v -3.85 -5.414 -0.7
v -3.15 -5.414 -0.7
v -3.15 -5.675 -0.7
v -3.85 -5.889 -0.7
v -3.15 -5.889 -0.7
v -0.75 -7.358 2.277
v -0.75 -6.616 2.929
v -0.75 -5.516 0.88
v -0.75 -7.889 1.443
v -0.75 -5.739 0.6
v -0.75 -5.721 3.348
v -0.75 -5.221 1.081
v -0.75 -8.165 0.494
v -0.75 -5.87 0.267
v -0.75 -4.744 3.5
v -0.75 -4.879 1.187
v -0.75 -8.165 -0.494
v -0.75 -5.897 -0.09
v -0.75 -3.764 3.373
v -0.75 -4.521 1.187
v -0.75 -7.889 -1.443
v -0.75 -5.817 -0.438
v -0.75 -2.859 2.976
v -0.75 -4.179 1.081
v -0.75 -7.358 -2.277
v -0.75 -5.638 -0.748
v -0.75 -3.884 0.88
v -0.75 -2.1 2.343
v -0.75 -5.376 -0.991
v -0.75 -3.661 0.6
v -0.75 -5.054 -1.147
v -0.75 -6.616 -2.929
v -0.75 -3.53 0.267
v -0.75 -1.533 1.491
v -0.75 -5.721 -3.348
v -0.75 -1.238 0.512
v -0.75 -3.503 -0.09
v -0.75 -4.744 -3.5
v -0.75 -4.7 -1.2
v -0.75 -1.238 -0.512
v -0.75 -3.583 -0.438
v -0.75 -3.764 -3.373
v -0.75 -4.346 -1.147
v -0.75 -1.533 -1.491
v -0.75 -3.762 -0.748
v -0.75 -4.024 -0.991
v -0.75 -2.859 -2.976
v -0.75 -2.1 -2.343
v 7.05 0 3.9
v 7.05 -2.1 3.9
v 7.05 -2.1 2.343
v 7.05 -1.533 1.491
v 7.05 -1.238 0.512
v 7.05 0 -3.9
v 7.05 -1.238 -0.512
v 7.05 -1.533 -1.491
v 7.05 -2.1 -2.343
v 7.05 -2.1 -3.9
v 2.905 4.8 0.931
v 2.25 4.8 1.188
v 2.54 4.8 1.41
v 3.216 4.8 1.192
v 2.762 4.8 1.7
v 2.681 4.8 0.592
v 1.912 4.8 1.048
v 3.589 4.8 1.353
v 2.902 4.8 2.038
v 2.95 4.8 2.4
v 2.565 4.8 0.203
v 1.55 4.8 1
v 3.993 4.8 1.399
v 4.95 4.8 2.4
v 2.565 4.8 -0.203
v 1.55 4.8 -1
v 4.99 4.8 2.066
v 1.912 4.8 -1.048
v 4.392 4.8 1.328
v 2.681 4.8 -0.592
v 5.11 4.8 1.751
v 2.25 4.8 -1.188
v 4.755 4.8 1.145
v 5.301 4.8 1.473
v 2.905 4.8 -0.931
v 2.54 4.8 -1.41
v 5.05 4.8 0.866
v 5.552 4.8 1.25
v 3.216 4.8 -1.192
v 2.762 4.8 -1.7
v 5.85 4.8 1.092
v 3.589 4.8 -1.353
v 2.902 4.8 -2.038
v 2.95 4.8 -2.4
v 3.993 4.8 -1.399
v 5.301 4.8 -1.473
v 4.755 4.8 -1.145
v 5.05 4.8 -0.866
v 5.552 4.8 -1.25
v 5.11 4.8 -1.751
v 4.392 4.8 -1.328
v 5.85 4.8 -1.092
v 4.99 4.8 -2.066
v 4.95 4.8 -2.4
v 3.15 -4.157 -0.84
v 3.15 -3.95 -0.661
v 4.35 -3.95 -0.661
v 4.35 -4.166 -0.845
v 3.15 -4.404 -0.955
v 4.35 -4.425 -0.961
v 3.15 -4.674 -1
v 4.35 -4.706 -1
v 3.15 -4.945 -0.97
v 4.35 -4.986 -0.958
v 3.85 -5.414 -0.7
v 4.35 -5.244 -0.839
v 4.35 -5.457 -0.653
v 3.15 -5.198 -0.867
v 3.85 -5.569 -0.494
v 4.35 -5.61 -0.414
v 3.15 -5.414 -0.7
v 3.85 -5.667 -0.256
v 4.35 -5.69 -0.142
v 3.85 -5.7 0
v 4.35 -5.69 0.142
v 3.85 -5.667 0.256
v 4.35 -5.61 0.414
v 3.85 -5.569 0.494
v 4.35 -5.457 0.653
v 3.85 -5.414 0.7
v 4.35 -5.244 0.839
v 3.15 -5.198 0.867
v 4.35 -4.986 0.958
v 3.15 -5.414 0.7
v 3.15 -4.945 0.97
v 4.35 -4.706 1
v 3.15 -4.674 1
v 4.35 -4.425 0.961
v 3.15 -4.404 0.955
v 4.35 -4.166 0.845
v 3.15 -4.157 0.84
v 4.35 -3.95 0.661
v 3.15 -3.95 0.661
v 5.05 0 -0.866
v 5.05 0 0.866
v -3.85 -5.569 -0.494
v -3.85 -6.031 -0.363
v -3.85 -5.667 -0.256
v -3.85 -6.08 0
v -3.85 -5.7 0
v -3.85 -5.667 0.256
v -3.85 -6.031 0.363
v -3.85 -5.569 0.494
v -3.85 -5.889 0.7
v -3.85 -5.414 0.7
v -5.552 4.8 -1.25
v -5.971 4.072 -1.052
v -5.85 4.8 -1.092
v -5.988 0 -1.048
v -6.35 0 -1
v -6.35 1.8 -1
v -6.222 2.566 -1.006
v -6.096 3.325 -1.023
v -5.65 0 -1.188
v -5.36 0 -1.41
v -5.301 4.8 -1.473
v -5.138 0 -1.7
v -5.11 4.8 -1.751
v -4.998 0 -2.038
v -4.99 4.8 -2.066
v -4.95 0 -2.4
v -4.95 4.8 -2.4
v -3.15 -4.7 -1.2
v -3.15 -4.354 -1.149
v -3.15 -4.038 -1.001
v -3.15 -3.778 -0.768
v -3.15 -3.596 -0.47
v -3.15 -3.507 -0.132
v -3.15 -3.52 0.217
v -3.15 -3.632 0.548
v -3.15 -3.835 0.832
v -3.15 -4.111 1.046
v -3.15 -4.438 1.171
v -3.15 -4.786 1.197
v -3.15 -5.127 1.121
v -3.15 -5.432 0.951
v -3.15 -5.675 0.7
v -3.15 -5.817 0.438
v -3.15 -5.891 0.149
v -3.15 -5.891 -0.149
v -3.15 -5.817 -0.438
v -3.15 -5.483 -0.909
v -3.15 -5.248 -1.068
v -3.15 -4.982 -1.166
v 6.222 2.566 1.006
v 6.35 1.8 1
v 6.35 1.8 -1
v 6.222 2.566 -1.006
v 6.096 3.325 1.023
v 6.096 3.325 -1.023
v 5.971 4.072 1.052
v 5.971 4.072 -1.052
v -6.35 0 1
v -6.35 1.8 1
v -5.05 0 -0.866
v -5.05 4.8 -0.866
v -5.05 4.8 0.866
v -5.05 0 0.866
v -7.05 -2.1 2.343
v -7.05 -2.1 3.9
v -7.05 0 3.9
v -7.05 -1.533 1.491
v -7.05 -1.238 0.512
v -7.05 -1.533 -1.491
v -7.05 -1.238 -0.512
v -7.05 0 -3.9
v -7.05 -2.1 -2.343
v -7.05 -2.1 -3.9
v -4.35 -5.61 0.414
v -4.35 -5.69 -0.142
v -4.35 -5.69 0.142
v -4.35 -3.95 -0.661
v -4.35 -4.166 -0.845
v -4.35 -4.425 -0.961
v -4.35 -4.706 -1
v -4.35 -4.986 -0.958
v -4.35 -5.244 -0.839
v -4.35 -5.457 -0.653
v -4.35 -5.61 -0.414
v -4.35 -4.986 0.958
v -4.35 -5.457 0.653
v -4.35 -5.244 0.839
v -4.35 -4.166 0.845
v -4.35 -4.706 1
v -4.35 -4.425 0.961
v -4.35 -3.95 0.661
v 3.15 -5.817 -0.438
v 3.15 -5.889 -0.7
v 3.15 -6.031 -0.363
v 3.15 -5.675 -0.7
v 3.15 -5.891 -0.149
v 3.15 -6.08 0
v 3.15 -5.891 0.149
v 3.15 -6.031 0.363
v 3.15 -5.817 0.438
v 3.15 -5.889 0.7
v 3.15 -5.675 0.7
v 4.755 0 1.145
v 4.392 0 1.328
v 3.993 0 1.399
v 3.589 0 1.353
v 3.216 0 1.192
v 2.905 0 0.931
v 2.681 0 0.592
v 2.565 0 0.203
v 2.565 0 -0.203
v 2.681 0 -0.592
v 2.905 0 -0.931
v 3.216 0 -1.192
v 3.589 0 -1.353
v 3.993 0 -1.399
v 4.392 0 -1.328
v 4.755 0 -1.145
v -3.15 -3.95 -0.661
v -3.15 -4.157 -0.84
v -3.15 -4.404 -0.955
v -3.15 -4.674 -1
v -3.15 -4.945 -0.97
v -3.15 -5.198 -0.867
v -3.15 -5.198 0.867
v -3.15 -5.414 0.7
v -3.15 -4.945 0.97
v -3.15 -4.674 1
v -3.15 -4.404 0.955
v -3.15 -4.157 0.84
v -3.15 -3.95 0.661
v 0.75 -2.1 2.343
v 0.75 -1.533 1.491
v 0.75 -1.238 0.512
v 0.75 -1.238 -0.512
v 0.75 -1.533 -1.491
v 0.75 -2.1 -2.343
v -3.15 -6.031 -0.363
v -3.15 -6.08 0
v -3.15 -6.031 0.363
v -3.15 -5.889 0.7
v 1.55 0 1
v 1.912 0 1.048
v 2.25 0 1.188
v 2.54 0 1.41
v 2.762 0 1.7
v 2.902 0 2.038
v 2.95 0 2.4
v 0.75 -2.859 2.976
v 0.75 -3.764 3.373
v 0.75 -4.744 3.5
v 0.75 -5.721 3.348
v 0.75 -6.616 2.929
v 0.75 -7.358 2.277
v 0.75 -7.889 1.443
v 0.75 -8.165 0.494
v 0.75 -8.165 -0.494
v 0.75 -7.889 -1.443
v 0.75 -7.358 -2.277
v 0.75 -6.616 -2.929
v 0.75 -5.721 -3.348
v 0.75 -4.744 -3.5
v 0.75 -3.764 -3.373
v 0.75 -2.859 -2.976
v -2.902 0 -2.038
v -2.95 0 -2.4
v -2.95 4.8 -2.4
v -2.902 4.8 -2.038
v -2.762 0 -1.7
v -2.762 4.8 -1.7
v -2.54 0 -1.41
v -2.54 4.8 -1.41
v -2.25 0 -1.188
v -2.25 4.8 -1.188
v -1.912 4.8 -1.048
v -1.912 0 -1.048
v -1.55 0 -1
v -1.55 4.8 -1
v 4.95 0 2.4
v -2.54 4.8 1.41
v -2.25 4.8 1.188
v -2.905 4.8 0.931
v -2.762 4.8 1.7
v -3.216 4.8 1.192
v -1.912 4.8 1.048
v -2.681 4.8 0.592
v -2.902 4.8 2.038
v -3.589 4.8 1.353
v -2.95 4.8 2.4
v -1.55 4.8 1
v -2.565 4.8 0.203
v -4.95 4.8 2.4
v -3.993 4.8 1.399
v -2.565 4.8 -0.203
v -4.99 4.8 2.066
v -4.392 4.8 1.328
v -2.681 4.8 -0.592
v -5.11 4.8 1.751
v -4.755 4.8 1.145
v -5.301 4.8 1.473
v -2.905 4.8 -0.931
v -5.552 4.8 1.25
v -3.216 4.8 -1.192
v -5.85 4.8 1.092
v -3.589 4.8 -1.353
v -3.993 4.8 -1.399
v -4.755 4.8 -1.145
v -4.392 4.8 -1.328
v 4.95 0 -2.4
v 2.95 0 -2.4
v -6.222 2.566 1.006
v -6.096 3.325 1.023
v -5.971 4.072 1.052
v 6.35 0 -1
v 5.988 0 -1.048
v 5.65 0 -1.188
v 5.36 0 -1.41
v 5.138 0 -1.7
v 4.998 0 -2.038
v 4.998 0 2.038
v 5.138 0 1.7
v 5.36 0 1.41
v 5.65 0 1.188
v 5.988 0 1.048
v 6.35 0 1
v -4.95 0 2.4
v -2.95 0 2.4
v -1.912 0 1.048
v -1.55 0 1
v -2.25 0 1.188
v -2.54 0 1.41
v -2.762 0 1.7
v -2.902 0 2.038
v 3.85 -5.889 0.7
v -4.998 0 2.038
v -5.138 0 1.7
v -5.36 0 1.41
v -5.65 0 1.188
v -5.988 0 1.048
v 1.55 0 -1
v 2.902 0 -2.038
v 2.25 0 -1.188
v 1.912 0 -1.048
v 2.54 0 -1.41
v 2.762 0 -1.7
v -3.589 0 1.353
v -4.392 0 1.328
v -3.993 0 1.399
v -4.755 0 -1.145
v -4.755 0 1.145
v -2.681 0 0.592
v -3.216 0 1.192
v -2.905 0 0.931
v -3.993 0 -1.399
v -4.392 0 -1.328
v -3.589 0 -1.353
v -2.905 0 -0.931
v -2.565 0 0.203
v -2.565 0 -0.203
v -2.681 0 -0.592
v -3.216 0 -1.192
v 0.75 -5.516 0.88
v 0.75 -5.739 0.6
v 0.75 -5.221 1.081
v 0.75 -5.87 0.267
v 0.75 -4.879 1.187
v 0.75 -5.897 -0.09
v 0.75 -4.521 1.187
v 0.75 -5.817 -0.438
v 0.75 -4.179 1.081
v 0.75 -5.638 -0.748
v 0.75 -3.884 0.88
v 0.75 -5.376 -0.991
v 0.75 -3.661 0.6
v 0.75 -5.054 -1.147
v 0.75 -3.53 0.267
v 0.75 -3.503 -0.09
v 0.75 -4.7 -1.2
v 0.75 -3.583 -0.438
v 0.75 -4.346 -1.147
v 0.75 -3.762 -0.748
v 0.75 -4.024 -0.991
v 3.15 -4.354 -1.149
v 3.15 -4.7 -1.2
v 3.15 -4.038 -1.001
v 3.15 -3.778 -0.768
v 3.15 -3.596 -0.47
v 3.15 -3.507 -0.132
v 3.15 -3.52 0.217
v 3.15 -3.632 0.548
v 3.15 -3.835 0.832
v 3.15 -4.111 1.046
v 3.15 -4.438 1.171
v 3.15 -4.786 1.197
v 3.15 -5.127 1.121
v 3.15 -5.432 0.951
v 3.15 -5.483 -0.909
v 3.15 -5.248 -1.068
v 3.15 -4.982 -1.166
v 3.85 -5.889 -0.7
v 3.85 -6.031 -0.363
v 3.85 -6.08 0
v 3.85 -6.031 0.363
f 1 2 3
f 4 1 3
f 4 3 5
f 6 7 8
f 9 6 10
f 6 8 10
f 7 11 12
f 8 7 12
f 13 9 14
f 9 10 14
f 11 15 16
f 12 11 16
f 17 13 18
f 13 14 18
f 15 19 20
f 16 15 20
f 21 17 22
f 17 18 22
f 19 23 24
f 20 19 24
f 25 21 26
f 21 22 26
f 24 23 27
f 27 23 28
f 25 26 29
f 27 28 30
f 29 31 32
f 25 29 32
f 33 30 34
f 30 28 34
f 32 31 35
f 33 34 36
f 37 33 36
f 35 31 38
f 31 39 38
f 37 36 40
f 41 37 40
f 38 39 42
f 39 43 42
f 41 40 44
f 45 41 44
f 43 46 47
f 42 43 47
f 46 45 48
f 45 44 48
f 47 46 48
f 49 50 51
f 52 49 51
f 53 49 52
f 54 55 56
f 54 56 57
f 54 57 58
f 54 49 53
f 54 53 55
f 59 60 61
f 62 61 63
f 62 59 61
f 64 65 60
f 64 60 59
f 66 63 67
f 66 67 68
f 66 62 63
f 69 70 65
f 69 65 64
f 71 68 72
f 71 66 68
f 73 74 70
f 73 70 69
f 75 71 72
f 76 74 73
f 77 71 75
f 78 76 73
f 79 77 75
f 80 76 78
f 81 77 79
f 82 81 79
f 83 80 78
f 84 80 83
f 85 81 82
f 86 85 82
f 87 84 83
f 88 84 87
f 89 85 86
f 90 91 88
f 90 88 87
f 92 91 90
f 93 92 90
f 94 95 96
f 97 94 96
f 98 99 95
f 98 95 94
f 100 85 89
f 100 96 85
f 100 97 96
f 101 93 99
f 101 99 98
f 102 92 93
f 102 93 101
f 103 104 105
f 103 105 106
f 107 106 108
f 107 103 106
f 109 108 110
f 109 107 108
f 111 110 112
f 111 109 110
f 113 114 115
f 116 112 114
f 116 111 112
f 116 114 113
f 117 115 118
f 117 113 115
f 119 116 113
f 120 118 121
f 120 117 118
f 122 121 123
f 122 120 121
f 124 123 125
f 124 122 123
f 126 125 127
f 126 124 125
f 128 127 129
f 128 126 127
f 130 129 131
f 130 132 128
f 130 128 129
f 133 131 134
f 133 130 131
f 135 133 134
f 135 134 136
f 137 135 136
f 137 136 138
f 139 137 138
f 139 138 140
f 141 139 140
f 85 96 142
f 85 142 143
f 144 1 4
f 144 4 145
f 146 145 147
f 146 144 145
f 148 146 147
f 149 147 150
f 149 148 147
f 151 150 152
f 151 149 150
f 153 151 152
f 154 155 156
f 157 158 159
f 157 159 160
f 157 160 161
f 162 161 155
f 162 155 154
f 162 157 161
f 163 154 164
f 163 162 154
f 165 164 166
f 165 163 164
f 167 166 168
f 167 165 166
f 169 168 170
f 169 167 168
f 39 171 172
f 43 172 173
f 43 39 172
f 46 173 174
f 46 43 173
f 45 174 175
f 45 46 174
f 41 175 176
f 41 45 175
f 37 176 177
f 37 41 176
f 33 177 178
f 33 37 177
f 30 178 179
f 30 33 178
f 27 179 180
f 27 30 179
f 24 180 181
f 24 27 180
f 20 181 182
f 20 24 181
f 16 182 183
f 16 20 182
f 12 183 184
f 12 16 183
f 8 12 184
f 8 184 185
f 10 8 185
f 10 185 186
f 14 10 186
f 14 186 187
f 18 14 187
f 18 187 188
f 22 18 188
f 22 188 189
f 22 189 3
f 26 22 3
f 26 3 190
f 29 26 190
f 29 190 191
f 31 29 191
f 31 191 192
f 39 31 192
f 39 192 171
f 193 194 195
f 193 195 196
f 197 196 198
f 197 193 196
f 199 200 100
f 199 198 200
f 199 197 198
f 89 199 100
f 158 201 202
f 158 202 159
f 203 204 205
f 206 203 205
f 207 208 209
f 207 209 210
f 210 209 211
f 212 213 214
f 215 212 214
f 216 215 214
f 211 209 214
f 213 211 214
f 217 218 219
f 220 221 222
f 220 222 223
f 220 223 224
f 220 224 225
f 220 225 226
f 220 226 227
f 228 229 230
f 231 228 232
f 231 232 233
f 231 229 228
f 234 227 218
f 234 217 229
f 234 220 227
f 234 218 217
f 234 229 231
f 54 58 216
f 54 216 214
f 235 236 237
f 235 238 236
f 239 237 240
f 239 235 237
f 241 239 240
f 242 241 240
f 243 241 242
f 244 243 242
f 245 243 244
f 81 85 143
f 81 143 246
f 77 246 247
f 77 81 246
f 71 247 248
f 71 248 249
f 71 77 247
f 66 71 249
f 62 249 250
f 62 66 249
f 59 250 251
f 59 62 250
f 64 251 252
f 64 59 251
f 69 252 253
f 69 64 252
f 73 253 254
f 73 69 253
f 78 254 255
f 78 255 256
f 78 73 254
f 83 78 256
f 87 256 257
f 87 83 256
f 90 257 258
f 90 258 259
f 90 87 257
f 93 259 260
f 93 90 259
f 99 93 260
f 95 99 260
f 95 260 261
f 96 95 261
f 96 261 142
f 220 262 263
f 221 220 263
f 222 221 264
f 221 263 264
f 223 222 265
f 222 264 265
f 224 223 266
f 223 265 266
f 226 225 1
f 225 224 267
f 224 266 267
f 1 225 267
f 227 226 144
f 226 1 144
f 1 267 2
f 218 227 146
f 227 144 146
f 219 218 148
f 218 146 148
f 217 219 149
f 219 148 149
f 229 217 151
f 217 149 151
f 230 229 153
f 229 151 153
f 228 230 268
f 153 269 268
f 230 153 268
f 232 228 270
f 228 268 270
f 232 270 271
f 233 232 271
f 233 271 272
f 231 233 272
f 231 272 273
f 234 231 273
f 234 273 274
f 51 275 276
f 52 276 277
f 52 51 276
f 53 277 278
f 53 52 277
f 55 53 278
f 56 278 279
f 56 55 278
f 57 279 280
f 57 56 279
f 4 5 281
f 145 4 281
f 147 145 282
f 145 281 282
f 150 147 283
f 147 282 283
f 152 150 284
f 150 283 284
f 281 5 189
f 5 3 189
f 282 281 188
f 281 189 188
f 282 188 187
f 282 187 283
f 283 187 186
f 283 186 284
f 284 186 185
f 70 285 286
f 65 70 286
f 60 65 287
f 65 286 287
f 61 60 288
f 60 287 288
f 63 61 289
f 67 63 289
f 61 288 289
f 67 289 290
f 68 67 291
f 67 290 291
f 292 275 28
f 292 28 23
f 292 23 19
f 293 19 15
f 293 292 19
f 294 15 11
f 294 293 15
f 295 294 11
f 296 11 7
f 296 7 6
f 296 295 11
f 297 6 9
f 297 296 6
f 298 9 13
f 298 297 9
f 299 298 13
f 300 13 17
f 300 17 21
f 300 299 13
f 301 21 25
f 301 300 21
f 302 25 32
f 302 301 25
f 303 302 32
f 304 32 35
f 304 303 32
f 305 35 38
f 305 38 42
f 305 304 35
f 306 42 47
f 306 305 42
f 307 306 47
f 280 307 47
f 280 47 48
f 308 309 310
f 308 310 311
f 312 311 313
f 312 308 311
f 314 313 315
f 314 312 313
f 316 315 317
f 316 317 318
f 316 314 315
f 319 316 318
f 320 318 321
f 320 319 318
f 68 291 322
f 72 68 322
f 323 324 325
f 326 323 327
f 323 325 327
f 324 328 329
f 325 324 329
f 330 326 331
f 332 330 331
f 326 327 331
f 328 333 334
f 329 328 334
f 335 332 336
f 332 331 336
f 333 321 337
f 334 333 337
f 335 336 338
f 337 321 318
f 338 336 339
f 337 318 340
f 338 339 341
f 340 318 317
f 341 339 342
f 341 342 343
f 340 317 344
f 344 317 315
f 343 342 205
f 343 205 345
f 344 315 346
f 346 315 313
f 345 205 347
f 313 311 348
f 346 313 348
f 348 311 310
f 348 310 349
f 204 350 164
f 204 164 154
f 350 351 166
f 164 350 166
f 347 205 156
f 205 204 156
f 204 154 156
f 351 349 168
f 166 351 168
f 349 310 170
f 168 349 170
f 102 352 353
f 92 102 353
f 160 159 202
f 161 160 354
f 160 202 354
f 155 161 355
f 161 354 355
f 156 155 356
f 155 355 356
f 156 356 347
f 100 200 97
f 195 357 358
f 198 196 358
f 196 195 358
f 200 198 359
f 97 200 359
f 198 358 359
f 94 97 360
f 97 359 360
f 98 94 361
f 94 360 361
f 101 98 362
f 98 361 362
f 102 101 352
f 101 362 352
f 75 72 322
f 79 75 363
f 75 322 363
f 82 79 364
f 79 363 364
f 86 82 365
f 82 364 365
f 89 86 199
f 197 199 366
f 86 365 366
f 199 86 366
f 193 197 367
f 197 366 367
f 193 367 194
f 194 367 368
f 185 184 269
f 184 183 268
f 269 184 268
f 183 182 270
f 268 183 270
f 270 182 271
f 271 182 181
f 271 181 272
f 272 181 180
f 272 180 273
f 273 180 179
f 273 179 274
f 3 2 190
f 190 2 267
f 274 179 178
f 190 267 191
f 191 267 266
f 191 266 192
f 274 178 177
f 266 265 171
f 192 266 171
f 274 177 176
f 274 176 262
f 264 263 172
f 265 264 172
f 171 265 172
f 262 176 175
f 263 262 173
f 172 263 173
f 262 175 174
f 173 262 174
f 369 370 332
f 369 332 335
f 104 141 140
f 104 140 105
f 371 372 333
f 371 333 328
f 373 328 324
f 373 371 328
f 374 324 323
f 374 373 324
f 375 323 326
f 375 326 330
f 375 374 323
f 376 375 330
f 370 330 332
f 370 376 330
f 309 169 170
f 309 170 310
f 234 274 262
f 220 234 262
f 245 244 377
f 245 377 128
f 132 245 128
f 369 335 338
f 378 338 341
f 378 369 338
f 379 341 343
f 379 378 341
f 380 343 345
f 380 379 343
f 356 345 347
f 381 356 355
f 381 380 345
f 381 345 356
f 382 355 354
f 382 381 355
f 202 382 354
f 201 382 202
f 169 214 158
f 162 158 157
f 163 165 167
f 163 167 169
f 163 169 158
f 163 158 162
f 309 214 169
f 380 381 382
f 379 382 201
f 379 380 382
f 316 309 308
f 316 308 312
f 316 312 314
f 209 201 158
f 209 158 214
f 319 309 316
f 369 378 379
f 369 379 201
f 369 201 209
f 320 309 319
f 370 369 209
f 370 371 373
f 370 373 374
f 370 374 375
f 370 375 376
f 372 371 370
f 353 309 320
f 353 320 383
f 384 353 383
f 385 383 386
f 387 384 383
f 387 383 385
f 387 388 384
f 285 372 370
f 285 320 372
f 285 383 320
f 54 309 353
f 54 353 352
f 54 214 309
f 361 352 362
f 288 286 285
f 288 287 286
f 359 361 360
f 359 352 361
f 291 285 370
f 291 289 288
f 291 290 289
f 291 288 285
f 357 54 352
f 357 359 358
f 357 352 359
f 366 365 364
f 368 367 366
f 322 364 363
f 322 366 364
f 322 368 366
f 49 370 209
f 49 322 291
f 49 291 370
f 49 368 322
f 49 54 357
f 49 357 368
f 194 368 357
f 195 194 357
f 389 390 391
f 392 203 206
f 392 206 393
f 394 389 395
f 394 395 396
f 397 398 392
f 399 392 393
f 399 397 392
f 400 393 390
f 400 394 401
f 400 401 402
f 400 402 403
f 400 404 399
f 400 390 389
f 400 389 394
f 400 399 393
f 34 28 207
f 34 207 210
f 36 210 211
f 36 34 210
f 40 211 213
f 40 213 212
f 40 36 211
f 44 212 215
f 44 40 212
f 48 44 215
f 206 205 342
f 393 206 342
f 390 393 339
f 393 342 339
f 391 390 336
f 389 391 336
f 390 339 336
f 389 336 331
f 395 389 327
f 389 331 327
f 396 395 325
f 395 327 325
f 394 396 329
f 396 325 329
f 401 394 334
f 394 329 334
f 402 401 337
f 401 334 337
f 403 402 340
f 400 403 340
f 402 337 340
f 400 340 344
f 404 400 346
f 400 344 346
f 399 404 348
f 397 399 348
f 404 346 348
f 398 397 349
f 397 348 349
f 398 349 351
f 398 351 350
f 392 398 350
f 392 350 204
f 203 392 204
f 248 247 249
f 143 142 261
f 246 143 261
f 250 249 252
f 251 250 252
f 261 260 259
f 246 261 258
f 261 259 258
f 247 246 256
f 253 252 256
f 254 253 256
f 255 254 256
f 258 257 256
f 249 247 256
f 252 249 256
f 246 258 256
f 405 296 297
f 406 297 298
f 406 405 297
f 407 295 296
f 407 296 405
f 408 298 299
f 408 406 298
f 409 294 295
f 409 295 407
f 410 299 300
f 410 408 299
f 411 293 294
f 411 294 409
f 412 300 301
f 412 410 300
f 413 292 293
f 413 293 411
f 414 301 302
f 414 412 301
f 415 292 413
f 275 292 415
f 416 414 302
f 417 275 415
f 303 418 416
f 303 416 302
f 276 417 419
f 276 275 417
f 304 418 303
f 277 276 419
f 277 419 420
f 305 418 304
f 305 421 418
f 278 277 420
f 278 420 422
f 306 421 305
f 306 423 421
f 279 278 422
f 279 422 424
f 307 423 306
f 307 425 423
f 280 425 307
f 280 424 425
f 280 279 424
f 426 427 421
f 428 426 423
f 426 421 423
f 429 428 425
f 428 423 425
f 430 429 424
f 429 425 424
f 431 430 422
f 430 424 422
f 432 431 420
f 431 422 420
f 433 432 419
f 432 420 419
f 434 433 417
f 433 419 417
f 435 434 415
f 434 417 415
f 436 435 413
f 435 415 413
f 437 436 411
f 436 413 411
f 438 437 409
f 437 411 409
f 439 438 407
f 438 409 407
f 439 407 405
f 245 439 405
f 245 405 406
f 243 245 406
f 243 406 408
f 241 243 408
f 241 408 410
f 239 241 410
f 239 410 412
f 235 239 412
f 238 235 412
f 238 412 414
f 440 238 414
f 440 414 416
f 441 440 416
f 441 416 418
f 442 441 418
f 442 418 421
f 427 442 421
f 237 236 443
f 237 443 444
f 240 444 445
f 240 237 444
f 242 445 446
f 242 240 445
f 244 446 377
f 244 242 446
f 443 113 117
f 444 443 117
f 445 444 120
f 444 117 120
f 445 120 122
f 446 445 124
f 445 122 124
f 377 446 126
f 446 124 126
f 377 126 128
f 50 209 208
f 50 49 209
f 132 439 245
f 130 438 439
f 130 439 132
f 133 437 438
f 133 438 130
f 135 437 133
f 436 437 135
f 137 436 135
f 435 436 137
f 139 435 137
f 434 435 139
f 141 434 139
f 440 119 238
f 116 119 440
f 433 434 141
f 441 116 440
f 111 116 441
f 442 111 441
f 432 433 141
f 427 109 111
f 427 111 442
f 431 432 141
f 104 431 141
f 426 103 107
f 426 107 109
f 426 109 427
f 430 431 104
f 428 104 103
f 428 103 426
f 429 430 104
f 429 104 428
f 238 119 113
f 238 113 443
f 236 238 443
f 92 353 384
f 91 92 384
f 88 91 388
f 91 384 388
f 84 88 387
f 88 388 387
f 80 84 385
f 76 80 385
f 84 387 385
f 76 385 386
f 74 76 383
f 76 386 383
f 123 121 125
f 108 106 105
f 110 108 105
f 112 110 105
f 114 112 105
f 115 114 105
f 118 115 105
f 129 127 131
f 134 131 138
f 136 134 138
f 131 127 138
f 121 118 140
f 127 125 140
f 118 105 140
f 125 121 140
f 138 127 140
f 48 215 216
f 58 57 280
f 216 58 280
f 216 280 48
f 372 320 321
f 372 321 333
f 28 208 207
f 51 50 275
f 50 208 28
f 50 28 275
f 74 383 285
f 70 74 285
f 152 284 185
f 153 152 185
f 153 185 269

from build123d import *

# Parameters (mm, degrees)
HIB_BASE_DEPTH        = 7.05
SKETCH1_3_R           = 3.5
LEG_JOINT_DEPTH       = 0.75
SKETCH2_R             = 1.2
LEG_PEG_DEPTH         = 2.4
LEG_PEG_INNER_DEPTH   = 1.2
LEG_LOCK_DEPTH        = 0.7
HIP_PEG_DEPTH         = 4.8
HIP_CAVITY_DEPTH      = 4.8
HIP_PEG_CHAMFER_DEPTH = 4.9


with BuildPart() as part:
    # Sketch1 → Hib Base (new body, symmetric)
    with BuildSketch(Plane(origin=(0, 0, 0), x_dir=(0, 0, -1), z_dir=(1, 0, 0))):
        with BuildLine():
            ThreePointArc((-2.343074903, -2.1), (0, -1.2), (2.343074903, -2.1))
            Line((2.343074903, -2.1), (3.9, -2.1))
            Line((3.9, -2.1), (3.9, 0))
            Line((3.9, 0), (-3.9, 0))
            Line((-3.9, 0), (-3.9, -2.1))
            Line((-3.9, -2.1), (-2.343074903, -2.1))
        make_face()
    extrude(amount=HIB_BASE_DEPTH, both=True)

    # Sketch1<3> → Leg Joint (add, symmetric)
    with BuildSketch(Plane(origin=(0, 0, 0), x_dir=(0, 0, -1), z_dir=(1, 0, 0))):
        with Locations((0, -4.7)):
            Circle(SKETCH1_3_R)
    extrude(amount=LEG_JOINT_DEPTH, both=True)

    # Sketch2 → Leg Peg (add)
    with BuildSketch(Plane(origin=(0.75, 0, 0), x_dir=(0, 0, -1), z_dir=(1, 0, 0))):
        with Locations((0, -4.7)):
            Circle(SKETCH2_R)
    leg_peg = extrude(amount=LEG_PEG_DEPTH)

    # Sketch3 → Leg Peg Inner (add)
    with BuildSketch(Plane(origin=(3.15, 0, 0), x_dir=(0, 0, -1), z_dir=(1, 0, 0))):
        with BuildLine():
            Line((-0.661437828, -3.95), (0.661437828, -3.95))
            ThreePointArc((0.661437828, -3.95), (0, -5.7), (-0.661437828, -3.95))
        make_face()
    leg_peg_inner = extrude(amount=LEG_PEG_INNER_DEPTH)

    # Sketch4 → Leg Lock (add)
    with BuildSketch(Plane(origin=(3.15, 0, 0), x_dir=(0, 0, -1), z_dir=(1, 0, 0))):
        with BuildLine():
            Line((-0.7, -5.8892855), (-0.7, -5.414142843))
            ThreePointArc((-0.7, -5.414142843), (0, -5.7), (0.7, -5.414142843))
            Line((0.7, -5.414142843), (0.7, -5.8892855))
            ThreePointArc((0.7, -5.8892855), (0, -6.08), (-0.7, -5.8892855))
        make_face()
    leg_lock = extrude(amount=LEG_LOCK_DEPTH)

    # Sketch5 → Hip Peg (add)
    with BuildSketch(Plane(origin=(0, 0, 0), x_dir=(1, 0, 0), z_dir=(0, 1, 0))):
        with BuildLine():
            ThreePointArc((1.55, -1), (2.539949494, -1.410050506), (2.95, -2.4))
            Line((2.95, -2.4), (4.95, -2.4))
            ThreePointArc((4.95, -2.4), (5.360050506, -1.410050506), (6.35, -1))
            Line((6.35, -1), (6.35, 1))
            ThreePointArc((6.35, 1), (5.360050506, 1.410050506), (4.95, 2.4))
            Line((4.95, 2.4), (2.95, 2.4))
            ThreePointArc((2.95, 2.4), (2.539949494, 1.410050506), (1.55, 1))
            Line((1.55, 1), (1.55, -1))
        make_face()
    hip_peg = extrude(amount=HIP_PEG_DEPTH)

    # Sketch6 → Hip Cavity (cut)
    with BuildSketch(Plane(origin=(0, 4.8, 0), x_dir=(1, 0, 0), z_dir=(0, 1, 0))):
        with BuildLine():
            Line((5.05, 0.866025404), (5.05, -0.866025404))
            ThreePointArc((5.05, -0.866025404), (2.55, 0), (5.05, 0.866025404))
        make_face()
    hip_cavity = extrude(amount=-HIP_CAVITY_DEPTH, mode=Mode.SUBTRACT)

    # Sketch7 → Hip Peg Chamfer (cut, symmetric)
    with BuildSketch(Plane.XY):
        Polygon((6.35, 4.8), (6.35, 1.8), (5.85, 4.8), align=None)
    hip_peg_chamfer = extrude(amount=HIP_PEG_CHAMFER_DEPTH, both=True, mode=Mode.SUBTRACT)

    # Mirror1: Leg Peg, Leg Peg Inner, Leg Lock, Hip Peg, Hip Cavity, Hip Peg Chamfer across plane
    add(leg_peg.mirror(Plane(origin=(0, 0, 0), x_dir=(0, 0, 1), z_dir=(1, 0, 0))))
    add(leg_peg_inner.mirror(Plane(origin=(0, 0, 0), x_dir=(0, 0, 1), z_dir=(1, 0, 0))))
    add(leg_lock.mirror(Plane(origin=(0, 0, 0), x_dir=(0, 0, 1), z_dir=(1, 0, 0))))
    add(hip_peg.mirror(Plane(origin=(0, 0, 0), x_dir=(0, 0, 1), z_dir=(1, 0, 0))))
    add(hip_cavity.mirror(Plane(origin=(0, 0, 0), x_dir=(0, 0, 1), z_dir=(1, 0, 0))), mode=Mode.SUBTRACT)
    add(hip_peg_chamfer.mirror(Plane(origin=(0, 0, 0), x_dir=(0, 0, 1), z_dir=(1, 0, 0))), mode=Mode.SUBTRACT)


solid = part.part
